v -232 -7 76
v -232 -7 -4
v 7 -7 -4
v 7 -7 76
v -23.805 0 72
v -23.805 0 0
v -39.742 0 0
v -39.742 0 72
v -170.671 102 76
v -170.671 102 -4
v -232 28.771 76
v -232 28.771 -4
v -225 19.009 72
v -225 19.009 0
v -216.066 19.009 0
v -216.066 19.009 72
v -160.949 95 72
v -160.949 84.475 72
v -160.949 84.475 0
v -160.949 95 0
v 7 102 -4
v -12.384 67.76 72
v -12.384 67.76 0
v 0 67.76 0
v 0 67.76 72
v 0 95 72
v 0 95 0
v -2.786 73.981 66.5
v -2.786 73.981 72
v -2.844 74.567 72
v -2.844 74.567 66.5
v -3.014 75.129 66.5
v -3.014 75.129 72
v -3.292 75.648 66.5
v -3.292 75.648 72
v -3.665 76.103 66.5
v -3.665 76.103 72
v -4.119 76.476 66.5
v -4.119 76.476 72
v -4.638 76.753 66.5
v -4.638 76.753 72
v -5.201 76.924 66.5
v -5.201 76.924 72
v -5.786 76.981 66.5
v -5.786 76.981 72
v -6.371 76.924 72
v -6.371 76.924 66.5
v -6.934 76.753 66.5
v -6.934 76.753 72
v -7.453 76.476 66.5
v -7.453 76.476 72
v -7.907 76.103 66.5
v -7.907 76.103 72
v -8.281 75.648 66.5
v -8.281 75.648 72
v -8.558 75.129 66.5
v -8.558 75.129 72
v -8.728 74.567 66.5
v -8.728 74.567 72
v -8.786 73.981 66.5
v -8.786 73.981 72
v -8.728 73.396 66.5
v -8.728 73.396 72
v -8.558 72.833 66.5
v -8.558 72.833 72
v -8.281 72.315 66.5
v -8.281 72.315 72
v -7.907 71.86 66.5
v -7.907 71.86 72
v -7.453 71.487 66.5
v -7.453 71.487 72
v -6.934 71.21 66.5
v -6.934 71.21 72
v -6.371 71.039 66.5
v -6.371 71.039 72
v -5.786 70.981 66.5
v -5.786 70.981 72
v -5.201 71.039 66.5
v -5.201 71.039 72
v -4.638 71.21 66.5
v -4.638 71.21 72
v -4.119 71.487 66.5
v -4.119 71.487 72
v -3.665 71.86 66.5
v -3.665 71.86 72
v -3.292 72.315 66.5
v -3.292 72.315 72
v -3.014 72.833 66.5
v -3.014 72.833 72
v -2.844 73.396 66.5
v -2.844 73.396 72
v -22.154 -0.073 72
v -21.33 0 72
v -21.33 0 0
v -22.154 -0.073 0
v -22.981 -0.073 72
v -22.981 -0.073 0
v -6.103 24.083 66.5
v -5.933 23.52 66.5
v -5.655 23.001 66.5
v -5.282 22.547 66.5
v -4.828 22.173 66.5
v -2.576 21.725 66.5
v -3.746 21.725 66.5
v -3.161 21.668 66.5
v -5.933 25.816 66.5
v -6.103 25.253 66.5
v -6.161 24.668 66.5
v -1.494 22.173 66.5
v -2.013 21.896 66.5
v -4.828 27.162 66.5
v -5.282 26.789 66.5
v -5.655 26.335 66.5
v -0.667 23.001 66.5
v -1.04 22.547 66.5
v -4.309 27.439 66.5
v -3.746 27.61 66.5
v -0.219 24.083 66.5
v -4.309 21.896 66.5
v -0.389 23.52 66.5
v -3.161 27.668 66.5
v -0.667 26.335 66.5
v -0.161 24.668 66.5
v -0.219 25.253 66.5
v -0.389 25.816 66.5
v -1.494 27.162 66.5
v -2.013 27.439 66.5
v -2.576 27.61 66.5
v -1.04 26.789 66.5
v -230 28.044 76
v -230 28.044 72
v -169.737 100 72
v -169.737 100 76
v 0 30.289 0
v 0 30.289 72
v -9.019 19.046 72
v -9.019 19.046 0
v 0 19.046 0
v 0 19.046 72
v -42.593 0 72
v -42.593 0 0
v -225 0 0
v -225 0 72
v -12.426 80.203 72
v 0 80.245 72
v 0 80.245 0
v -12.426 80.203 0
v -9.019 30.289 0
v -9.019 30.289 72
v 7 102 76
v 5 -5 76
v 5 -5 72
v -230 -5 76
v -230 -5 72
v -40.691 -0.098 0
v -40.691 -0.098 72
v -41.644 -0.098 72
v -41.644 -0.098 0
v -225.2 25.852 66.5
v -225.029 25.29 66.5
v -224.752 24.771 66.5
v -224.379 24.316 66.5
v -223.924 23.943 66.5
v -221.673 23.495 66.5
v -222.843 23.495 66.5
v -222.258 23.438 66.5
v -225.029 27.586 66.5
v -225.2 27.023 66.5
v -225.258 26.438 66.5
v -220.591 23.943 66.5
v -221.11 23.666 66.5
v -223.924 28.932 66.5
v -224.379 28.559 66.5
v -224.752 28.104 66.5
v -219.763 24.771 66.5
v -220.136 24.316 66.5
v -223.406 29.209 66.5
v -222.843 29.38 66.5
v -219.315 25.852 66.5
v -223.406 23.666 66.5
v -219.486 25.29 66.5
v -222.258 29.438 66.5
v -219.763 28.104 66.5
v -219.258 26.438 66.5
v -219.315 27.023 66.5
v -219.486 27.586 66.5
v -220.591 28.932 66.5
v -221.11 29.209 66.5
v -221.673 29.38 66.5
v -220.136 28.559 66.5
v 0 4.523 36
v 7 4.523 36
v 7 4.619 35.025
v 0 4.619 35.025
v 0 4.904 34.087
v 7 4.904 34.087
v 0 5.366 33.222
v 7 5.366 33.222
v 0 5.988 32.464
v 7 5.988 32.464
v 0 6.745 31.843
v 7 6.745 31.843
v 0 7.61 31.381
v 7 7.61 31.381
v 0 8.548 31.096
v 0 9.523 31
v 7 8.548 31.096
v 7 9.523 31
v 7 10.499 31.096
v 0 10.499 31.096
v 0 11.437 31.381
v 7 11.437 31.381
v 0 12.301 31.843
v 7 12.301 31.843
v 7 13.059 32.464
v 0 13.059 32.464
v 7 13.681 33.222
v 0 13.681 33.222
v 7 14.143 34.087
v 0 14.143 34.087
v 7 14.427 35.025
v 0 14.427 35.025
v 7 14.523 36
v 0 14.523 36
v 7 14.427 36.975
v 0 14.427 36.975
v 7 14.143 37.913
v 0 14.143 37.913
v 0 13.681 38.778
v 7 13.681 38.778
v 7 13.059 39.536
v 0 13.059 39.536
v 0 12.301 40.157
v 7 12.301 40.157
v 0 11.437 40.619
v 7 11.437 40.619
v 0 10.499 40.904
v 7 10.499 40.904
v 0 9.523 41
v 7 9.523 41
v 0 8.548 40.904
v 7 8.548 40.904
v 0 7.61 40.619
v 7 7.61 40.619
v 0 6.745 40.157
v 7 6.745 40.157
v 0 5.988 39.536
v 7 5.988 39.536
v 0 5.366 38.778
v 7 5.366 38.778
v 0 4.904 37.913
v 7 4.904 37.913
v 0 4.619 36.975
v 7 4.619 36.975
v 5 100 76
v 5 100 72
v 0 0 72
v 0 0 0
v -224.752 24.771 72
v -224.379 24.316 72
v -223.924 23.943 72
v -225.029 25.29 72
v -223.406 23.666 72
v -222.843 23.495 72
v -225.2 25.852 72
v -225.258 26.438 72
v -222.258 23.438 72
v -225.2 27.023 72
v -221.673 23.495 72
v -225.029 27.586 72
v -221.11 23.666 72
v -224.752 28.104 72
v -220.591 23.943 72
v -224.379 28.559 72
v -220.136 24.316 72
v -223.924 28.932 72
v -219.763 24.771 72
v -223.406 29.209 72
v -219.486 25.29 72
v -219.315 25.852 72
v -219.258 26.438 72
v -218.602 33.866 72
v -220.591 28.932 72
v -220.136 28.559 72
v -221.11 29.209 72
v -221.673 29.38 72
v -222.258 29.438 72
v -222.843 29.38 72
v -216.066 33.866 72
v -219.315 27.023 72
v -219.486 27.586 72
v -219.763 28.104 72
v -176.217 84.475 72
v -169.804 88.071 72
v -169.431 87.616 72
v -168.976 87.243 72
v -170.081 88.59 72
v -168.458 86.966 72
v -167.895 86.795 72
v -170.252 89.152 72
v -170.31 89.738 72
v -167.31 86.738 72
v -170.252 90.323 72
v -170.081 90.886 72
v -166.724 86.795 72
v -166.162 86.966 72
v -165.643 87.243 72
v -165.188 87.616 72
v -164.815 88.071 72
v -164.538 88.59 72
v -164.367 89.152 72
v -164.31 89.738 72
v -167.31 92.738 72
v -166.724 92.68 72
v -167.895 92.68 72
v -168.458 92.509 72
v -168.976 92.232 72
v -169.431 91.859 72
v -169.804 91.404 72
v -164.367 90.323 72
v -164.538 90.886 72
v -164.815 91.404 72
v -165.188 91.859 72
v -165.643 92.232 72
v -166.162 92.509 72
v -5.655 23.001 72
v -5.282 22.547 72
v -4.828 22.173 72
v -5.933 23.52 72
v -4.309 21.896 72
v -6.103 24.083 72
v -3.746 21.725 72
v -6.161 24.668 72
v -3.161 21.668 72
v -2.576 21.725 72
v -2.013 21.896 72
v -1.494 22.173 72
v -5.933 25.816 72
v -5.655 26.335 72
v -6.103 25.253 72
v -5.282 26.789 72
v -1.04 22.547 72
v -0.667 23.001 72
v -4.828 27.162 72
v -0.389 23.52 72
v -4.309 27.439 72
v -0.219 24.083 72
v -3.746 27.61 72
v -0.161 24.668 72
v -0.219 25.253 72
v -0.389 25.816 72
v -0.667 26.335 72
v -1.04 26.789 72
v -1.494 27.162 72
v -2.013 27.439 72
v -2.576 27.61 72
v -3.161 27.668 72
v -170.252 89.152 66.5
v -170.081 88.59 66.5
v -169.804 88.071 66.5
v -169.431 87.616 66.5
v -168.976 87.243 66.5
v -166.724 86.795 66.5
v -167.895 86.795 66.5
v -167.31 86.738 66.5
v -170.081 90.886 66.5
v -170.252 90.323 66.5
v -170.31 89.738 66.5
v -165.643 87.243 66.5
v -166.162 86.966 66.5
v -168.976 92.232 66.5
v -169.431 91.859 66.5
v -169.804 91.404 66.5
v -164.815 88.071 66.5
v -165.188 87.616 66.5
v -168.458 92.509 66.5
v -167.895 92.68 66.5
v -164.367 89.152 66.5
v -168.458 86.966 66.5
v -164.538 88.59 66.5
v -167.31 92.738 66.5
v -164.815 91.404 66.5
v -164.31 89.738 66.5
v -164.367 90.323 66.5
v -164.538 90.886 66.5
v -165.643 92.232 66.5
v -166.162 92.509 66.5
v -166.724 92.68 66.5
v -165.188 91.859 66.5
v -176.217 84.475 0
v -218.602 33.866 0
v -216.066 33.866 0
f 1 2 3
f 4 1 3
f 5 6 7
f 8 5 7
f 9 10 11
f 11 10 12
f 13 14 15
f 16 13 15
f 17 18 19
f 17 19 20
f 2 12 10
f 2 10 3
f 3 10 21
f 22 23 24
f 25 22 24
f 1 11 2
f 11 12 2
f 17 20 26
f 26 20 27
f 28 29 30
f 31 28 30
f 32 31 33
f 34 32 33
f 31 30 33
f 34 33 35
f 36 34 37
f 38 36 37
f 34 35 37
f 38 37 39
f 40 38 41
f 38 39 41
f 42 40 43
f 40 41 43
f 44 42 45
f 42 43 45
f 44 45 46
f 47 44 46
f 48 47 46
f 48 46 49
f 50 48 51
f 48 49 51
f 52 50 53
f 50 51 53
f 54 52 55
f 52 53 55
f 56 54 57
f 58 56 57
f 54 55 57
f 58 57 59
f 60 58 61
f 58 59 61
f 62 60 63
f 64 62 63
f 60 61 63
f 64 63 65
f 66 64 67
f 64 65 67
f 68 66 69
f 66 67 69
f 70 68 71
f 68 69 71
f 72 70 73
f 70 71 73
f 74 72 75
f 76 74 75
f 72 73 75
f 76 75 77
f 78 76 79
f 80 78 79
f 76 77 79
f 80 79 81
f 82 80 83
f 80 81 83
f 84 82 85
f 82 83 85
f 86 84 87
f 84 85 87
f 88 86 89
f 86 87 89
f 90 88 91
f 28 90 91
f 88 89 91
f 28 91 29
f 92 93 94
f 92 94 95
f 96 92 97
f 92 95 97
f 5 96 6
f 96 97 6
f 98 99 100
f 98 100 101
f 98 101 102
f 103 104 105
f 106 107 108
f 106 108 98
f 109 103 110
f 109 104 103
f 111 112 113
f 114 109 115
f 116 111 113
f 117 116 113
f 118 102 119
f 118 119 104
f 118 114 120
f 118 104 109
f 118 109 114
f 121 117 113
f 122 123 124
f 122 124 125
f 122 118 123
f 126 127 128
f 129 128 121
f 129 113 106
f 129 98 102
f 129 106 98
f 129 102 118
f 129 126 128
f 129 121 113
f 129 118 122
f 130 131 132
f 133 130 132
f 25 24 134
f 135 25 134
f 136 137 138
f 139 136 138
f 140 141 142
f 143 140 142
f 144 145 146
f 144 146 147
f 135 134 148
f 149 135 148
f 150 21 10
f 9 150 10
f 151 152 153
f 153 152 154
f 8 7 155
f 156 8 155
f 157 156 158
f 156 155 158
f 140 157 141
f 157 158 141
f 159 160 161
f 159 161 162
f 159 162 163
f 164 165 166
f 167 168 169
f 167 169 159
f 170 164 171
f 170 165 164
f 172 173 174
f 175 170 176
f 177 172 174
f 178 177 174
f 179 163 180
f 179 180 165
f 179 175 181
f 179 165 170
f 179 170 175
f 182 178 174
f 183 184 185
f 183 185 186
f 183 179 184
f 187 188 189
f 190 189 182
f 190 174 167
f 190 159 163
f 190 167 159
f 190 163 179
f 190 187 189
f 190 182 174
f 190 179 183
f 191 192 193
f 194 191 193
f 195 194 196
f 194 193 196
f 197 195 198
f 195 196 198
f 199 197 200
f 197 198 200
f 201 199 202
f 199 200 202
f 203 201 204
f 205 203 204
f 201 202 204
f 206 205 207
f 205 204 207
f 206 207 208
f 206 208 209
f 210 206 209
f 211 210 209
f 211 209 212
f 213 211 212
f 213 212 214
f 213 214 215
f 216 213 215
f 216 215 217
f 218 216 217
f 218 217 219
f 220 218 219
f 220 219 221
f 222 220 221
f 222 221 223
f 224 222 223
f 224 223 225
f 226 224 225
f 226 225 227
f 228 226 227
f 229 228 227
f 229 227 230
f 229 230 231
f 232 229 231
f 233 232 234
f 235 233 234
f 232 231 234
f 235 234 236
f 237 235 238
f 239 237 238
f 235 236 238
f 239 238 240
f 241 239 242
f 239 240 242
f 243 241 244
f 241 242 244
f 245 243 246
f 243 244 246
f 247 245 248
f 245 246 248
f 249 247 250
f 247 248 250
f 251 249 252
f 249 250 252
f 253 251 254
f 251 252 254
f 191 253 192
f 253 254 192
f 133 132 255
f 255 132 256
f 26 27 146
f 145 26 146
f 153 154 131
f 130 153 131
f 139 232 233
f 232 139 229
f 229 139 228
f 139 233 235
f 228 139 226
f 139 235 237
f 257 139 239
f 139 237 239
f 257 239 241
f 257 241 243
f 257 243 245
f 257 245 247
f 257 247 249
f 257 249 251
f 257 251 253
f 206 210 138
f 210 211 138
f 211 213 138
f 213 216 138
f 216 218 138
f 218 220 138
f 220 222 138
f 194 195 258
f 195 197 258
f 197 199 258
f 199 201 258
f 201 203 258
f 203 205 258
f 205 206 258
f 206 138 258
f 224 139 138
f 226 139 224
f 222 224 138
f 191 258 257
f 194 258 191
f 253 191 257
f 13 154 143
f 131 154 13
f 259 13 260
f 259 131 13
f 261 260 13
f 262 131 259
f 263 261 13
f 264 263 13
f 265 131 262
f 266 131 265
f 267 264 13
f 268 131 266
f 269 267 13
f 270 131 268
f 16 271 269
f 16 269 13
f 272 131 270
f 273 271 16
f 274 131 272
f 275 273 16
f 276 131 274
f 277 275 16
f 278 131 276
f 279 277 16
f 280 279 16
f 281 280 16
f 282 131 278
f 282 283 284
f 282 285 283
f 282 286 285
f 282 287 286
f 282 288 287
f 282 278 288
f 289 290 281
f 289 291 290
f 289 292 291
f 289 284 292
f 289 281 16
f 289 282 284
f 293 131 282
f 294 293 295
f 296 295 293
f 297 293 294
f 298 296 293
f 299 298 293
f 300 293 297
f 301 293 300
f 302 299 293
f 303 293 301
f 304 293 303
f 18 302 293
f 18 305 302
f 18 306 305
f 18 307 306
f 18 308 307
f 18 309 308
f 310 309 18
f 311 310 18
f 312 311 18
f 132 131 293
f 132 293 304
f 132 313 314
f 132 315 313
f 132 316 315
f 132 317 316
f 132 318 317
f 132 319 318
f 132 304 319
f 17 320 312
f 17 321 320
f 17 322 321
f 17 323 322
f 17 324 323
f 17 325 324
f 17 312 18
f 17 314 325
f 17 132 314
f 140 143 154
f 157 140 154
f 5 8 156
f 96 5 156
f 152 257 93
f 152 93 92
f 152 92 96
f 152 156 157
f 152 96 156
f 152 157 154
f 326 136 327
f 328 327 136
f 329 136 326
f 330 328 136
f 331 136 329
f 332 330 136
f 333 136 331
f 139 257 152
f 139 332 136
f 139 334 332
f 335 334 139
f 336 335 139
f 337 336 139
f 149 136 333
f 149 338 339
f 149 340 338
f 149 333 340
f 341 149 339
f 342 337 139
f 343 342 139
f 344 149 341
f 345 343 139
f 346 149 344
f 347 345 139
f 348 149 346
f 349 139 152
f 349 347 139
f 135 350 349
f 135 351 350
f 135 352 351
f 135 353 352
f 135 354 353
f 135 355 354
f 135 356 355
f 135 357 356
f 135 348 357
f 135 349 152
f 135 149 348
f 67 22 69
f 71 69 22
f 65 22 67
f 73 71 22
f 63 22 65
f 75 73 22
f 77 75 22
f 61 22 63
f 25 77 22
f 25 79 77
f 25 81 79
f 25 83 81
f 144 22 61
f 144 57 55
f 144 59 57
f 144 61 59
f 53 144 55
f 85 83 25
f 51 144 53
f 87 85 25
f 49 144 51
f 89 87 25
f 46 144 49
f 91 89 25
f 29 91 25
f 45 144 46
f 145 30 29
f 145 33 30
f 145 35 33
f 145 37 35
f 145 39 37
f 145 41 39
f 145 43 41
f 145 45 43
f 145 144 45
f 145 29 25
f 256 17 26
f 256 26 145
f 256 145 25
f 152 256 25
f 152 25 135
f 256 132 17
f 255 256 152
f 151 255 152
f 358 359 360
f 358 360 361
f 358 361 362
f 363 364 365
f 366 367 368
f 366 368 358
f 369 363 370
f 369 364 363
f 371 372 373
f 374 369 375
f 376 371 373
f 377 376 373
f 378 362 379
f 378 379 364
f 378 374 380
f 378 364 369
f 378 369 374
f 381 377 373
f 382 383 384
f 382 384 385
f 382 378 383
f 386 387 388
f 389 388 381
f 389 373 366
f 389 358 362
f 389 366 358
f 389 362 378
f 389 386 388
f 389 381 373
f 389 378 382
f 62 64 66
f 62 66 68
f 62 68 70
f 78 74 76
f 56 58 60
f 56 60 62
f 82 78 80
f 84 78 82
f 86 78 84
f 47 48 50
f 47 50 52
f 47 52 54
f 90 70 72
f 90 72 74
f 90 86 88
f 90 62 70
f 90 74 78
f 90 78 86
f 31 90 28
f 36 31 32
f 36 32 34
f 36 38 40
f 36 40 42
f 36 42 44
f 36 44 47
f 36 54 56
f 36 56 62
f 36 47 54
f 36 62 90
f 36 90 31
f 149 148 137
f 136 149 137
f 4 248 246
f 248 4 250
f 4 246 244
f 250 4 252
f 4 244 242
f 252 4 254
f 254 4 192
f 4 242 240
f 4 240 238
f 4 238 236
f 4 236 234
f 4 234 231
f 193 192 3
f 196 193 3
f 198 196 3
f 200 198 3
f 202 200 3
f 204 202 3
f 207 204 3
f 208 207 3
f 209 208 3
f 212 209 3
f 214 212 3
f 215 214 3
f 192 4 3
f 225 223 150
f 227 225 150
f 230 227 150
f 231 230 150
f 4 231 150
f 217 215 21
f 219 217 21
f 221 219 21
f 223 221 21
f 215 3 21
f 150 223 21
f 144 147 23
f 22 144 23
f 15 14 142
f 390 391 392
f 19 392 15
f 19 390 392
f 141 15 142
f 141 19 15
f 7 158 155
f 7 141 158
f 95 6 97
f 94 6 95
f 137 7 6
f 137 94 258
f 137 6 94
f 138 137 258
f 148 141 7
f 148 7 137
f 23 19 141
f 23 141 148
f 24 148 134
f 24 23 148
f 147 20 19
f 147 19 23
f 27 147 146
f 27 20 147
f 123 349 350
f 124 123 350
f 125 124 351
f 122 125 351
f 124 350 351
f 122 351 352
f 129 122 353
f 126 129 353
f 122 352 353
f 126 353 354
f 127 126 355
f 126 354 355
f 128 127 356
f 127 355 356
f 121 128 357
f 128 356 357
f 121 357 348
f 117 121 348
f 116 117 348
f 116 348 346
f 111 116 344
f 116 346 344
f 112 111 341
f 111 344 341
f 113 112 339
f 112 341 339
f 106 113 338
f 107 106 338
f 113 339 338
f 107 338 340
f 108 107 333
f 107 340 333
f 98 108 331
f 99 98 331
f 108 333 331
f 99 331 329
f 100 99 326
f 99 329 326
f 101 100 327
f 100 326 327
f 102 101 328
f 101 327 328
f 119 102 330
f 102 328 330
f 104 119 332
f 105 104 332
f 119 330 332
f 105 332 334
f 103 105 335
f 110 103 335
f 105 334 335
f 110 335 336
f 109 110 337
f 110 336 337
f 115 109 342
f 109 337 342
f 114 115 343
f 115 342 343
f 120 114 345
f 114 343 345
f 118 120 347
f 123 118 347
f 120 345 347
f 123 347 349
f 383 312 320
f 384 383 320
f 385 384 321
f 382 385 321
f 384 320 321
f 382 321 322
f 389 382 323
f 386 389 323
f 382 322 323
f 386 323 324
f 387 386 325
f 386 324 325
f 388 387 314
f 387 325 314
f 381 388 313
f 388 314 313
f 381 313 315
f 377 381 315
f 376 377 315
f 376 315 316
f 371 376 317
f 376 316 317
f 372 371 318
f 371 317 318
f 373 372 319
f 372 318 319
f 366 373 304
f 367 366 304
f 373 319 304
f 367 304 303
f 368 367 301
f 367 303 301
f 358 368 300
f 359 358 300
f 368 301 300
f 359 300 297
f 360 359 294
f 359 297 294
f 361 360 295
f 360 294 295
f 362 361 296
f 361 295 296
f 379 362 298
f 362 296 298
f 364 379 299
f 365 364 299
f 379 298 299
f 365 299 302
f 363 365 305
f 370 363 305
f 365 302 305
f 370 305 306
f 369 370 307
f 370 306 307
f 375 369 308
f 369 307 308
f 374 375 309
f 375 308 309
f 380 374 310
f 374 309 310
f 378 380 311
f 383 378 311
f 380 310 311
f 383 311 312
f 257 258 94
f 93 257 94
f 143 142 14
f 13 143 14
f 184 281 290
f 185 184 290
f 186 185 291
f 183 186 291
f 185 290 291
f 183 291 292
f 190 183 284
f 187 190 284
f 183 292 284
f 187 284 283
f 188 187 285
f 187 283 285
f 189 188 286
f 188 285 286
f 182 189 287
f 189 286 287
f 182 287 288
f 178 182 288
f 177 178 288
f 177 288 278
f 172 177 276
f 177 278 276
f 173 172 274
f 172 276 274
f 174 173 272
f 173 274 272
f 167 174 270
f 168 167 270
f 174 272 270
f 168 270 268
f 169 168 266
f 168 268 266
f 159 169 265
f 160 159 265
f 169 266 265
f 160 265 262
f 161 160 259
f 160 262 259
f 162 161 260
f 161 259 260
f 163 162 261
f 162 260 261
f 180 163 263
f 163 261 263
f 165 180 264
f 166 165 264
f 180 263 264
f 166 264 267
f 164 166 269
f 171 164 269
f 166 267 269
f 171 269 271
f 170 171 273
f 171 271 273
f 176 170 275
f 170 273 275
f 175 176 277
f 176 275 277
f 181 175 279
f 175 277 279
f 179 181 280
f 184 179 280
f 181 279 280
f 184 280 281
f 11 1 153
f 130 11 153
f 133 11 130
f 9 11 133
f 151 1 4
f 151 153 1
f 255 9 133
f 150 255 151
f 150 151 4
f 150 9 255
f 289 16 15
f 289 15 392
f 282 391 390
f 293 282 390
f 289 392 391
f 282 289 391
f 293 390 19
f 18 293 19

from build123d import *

# Parameters (mm, degrees)
F1_DEPTH = 72
F3_DEPTH = 4
F5_DEPTH = 4
F7_DEPTH = 25
F8_R     = 3
F9_DEPTH = 5.5


with BuildPart() as f1:
    # F0 (on Top) → F1 (new body)
    with BuildSketch(Plane.XY):
        Polygon((-232, 28.7712871801), (-232, 9), (-232, -7), (7, -7), (7, 102), (-170.6706311353, 102), align=None)
        with BuildLine():
            Line((0, 9), (0, 0))
            Line((0, 0), (-21.3304098297, 0))
            ThreePointArc((-21.3304098297, 0), (-22.567460882, -0.0826411216), (-23.8045119343, 0))
            Line((-23.8045119343, 0), (-39.7422893838, 0))
            ThreePointArc((-39.7422893838, 0), (-41.1674409876, -0.1098453274), (-42.5925925915, 0))
            Line((-42.5925925915, 0), (-59.7671166301, 0))
            Line((-59.7671166301, 0), (-78.3671166301, 0))
            Line((-78.3671166301, 0), (-96.9671166301, 0))
            Line((-96.9671166301, 0), (-115.5671166301, 0))
            Line((-115.5671166301, 0), (-134.1671166301, 0))
            Line((-134.1671166301, 0), (-152.7671166301, 0))
            Line((-152.7671166301, 0), (-171.3671166301, 0))
            Line((-171.3671166301, 0), (-189.9671166301, 0))
            Line((-189.9671166301, 0), (-208.5671166301, 0))
            Line((-208.5671166301, 0), (-225, 0))
            Line((-225, 0), (-225, 9))
            Line((-225, 9), (-225, 19.009443))
            Line((-225, 19.009443), (-216.0657793283, 19.009443))
            Line((-216.0657793283, 19.009443), (-216.0657793283, 33.8660545808))
            Line((-216.0657793283, 33.8660545808), (-218.6024326595, 33.8660545808))
            Line((-218.6024326595, 33.8660545808), (-176.2169181556, 84.4753585209))
            Line((-176.2169181556, 84.4753585209), (-160.9487113722, 84.4753585209))
            Line((-160.9487113722, 84.4753585209), (-160.9487113722, 95))
            Line((-160.9487113722, 95), (0, 95))
            Line((0, 95), (0, 80.24520114))
            Line((0, 80.24520114), (-12.4263259421, 80.2028560212))
            Line((-12.4263259421, 80.2028560212), (-12.3839236644, 67.7597565904))
            Line((-12.3839236644, 67.7597565904), (0, 67.7597565904))
            Line((0, 67.7597565904), (0, 30.28925322))
            Line((0, 30.28925322), (-9.0186540037, 30.28925322))
            Line((-9.0186540037, 30.28925322), (-9.0186540037, 19.0464295447))
            Line((-9.0186540037, 19.0464295447), (0, 19.0464295447))
            Line((0, 19.0464295447), (0, 9))
        make_face(mode=Mode.SUBTRACT)
    extrude(amount=F1_DEPTH)

    # F2 (on Top) → F3 (join)
    with BuildSketch(Plane.XY):
        Polygon((-170.6706311353, 102), (-232, 28.7712871801), (-232, -7), (7, -7), (7, 102), align=None)
    extrude(amount=-F3_DEPTH)

    # F4 (on face) → F5 (join)
    with BuildSketch(Plane.XY.offset(72)):
        Polygon((7, 102), (-170.6706311353, 102), (-232, 28.7712871801), (-232, -7), (7, -7), align=None)
        Polygon((-230, -5), (-230, 28.0444074988), (-169.7368749983, 100), (5, 100), (5, -5), align=None, mode=Mode.SUBTRACT)
    extrude(amount=F5_DEPTH)

    # F6 (on face) → F7 (cut)
    with BuildSketch(Plane.YZ.offset(7)):
        with BuildLine():
            Line((4.5232147723, 36), (14.5232147723, 36))
            ThreePointArc((14.5232147723, 36), (9.5232147723, 41), (4.5232147723, 36))
        make_face()
        with BuildLine():
            ThreePointArc((4.5232147723, 36), (9.5232147723, 31), (14.5232147723, 36))
            Line((14.5232147723, 36), (4.5232147723, 36))
        make_face()
    extrude(amount=-F7_DEPTH, mode=Mode.SUBTRACT)

    # F8 (on face) → F9 (cut)
    with BuildSketch(Plane.XY.offset(72)):
        with Locations((-167.3095971346, 89.7376792604)):
            Circle(F8_R)
        with Locations((-222.2577780485, 26.4377487904)):
            Circle(F8_R)
        with Locations((-5.7860915549, 73.9813063058)):
            Circle(F8_R)
        with Locations((-3.1610322185, 24.6678413823)):
            Circle(F8_R)
    extrude(amount=-F9_DEPTH, mode=Mode.SUBTRACT)


solid = f1.part
